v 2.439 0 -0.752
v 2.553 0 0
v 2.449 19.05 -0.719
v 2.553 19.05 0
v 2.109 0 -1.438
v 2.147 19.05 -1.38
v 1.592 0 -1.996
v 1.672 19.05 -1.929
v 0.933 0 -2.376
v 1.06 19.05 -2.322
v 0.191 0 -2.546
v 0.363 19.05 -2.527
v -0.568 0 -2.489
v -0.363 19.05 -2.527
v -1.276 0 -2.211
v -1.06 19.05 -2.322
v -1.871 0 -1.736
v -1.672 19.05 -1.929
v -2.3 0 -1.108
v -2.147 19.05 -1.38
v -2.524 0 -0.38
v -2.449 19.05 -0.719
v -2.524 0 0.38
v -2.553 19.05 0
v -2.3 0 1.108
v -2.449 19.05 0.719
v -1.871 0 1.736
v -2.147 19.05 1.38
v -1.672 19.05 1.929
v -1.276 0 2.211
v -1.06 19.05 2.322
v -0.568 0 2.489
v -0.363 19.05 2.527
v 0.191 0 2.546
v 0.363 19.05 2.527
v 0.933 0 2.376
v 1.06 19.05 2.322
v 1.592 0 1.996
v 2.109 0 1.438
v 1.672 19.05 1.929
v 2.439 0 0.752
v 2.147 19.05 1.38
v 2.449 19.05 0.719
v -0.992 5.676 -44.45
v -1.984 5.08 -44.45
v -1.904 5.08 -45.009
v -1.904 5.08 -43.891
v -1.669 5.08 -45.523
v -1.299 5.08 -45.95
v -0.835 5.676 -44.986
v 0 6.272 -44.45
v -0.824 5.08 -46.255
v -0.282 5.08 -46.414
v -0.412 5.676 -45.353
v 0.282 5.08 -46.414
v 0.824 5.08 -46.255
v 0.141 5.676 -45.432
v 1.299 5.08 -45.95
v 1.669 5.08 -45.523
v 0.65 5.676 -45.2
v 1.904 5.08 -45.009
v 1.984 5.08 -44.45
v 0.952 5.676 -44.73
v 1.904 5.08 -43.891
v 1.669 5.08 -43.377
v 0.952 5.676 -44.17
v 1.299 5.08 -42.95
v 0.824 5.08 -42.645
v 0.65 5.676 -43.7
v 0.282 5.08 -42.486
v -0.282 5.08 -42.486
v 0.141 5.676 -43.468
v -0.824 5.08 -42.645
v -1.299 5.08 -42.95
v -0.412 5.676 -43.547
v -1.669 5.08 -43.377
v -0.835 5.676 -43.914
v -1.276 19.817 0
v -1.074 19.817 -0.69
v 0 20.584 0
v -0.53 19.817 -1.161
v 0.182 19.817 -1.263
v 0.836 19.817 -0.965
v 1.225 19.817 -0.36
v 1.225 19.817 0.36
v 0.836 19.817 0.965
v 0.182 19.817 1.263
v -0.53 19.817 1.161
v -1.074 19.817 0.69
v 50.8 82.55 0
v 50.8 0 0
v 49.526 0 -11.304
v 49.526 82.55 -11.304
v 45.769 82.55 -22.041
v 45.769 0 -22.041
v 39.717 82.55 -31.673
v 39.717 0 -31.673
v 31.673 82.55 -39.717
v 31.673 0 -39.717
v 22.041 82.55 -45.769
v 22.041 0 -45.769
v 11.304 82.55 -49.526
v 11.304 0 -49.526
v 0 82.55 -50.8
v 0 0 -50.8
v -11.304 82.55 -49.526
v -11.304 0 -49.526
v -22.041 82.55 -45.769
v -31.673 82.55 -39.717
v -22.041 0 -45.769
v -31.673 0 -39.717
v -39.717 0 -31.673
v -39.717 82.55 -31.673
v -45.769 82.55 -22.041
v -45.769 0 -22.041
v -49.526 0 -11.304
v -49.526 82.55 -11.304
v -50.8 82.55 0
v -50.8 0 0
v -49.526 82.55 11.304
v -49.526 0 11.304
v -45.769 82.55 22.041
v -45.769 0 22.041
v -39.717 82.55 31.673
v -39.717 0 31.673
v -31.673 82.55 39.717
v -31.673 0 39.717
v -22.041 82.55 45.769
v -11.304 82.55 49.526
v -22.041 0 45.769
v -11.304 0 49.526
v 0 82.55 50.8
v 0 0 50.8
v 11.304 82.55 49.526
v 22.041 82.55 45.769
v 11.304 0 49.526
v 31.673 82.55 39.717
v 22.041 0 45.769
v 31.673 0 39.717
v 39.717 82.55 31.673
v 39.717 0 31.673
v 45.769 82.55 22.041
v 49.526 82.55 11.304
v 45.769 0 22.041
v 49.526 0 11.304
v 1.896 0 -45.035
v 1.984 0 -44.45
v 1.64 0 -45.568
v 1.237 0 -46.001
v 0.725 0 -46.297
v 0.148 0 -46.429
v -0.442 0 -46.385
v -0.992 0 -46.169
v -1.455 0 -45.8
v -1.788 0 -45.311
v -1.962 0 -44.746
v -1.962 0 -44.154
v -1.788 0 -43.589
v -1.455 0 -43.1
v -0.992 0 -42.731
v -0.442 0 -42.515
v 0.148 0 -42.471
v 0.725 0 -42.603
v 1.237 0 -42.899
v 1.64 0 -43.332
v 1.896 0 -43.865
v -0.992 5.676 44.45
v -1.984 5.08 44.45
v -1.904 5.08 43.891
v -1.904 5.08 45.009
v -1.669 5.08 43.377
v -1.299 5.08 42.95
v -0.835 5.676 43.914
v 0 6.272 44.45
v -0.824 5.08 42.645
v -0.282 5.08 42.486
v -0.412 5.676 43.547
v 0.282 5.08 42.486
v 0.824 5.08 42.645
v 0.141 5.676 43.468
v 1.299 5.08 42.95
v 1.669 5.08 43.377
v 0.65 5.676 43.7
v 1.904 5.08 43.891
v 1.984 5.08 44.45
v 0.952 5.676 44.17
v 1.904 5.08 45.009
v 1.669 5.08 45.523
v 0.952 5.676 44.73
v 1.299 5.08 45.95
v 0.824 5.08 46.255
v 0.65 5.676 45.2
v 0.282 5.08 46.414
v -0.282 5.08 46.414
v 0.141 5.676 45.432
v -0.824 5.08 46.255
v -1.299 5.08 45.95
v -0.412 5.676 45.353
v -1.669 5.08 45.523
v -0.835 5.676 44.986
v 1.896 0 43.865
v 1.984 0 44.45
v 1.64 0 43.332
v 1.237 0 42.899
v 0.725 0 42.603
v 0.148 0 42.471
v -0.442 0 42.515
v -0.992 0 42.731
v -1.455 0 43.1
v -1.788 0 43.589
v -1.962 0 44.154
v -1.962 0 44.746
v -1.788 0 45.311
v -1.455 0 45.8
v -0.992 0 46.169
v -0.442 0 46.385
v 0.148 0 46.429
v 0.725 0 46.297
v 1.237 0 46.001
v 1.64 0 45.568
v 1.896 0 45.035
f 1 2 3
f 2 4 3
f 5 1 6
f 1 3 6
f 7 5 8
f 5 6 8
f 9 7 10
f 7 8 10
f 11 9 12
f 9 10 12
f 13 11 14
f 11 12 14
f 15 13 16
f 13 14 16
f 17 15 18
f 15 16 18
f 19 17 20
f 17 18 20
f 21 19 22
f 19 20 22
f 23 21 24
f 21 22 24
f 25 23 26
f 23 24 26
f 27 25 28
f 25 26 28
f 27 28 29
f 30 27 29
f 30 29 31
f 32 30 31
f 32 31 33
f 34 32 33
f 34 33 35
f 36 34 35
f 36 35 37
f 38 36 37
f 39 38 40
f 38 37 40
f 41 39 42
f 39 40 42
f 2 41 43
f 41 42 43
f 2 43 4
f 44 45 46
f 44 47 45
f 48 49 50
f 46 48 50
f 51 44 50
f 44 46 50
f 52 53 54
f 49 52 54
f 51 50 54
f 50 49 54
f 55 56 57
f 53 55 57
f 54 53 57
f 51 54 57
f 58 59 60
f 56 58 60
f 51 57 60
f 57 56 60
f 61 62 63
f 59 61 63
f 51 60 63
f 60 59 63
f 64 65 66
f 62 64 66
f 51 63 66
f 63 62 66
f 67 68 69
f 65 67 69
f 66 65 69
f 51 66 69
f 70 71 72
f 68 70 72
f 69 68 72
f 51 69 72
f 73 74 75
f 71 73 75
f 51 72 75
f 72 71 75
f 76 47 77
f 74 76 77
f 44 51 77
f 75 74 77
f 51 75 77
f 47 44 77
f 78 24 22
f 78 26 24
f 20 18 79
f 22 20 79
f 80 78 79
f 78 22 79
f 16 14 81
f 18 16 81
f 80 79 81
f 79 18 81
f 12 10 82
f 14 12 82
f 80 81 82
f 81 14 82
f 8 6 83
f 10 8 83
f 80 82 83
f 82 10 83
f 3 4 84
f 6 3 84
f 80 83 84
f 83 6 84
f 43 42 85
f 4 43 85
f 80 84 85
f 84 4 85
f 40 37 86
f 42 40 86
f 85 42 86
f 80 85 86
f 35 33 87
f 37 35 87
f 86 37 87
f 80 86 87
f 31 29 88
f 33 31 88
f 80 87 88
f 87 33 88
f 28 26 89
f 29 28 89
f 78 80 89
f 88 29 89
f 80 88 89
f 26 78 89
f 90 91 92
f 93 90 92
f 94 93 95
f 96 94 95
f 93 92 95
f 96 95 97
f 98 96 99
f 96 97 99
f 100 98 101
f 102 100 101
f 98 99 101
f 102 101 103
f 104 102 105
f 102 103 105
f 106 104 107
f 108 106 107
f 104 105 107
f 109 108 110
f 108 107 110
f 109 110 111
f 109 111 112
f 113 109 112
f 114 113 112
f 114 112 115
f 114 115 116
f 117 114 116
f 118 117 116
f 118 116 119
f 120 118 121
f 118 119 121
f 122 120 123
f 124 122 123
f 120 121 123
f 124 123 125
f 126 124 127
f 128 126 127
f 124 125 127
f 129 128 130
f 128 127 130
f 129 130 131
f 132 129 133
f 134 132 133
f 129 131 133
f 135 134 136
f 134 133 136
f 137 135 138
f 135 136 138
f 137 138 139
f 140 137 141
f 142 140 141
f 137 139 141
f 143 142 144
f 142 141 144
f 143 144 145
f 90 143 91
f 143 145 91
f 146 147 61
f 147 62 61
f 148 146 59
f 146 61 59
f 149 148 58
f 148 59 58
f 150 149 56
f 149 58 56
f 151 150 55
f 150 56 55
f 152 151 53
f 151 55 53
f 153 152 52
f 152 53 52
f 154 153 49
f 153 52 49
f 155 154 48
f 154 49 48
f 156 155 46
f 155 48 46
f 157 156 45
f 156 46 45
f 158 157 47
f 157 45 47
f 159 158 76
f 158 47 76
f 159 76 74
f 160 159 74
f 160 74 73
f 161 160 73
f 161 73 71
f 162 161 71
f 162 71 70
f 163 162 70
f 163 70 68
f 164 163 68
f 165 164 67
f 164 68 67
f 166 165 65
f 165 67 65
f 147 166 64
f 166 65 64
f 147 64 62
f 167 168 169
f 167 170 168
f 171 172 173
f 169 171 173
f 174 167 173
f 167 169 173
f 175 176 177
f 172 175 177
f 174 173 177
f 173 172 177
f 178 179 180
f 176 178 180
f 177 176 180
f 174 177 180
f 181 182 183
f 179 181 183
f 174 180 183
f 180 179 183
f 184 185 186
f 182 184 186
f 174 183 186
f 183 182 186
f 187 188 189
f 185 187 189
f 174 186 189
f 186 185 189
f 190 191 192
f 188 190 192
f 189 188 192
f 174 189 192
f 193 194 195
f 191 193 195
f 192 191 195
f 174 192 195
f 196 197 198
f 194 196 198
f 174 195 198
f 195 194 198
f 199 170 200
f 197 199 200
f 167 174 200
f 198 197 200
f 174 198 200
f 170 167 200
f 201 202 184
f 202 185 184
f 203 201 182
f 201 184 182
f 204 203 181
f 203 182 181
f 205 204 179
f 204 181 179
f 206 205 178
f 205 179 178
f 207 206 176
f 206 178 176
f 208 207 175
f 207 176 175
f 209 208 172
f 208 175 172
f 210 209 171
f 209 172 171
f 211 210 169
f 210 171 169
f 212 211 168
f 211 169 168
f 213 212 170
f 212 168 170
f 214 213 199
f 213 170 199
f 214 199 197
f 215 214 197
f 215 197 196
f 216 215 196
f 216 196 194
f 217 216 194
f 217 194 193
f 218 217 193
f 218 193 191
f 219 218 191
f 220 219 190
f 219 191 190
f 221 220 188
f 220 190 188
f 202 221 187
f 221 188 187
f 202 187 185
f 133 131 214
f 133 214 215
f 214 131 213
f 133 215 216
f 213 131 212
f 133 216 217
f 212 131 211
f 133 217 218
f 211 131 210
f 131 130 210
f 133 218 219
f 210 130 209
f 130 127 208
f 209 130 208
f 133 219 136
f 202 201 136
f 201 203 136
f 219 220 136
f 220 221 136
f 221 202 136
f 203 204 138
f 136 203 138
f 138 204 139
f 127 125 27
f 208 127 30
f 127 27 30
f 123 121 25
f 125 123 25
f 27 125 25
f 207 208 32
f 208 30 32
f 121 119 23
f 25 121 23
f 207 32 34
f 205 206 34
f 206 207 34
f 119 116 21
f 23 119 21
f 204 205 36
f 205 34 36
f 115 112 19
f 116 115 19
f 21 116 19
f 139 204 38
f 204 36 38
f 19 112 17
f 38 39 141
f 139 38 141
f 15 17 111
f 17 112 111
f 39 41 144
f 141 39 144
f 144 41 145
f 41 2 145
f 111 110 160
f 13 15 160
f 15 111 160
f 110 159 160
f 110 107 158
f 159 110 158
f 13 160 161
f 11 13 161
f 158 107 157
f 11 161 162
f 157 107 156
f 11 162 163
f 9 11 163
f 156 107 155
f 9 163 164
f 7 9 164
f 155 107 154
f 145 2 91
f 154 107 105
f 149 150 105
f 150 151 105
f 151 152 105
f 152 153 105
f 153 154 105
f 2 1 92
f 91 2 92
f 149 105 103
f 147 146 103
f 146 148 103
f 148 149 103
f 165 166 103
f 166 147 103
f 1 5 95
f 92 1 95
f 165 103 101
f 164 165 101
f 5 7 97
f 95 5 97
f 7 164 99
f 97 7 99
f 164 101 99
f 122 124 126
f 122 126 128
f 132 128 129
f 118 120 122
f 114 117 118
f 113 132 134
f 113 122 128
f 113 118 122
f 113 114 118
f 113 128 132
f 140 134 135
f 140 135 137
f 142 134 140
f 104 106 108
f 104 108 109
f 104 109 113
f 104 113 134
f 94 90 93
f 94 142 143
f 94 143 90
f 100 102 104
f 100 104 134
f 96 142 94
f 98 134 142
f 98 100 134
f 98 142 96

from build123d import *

# Parameters (mm, degrees)
SKETCH1_R                           = 50.8
BOSS_EXTRUDE1_DEPTH                 = 82.55
F_1_4_20_TAPPED_HOLE1_D             = 5.1054
F_1_4_20_TAPPED_HOLE1_DEPTH         = 19.05
F_1_4_20_TAPPED_HOLE1_TIP           = 1.533816902
F_5_32_0_15625_DIAMETER_HOLE1_D     = 3.96875
F_5_32_0_15625_DIAMETER_HOLE1_DEPTH = 5.08
F_5_32_0_15625_DIAMETER_HOLE1_TIP   = 1.192332791


with BuildPart() as part:
    # Sketch1 → Boss-Extrude1 (new body)
    with BuildSketch(Plane(origin=(0, 0, 0), x_dir=(1, 0, 0), z_dir=(0, 1, 0))):
        Circle(SKETCH1_R)
    extrude(amount=BOSS_EXTRUDE1_DEPTH)

    # 1/4-20 Tapped Hole1
    with Locations(Plane(origin=(0, 0, 0), x_dir=(-1, 0, 0), z_dir=(0, -1, 0))):
        with Locations((0, 0)):
            Hole(F_1_4_20_TAPPED_HOLE1_D / 2, depth=F_1_4_20_TAPPED_HOLE1_DEPTH)
            with Locations((0, 0, -(F_1_4_20_TAPPED_HOLE1_DEPTH + F_1_4_20_TAPPED_HOLE1_TIP / 2))):  # 118° drill point
                Cone(0, F_1_4_20_TAPPED_HOLE1_D / 2, F_1_4_20_TAPPED_HOLE1_TIP, mode=Mode.SUBTRACT)

    # 5/32 (0.15625) Diameter Hole1
    with Locations(Plane(origin=(0, 0, 0), x_dir=(-1, 0, 0), z_dir=(0, -1, 0))):
        with Locations((0, 44.45), (0, -44.45)):
            Hole(F_5_32_0_15625_DIAMETER_HOLE1_D / 2, depth=F_5_32_0_15625_DIAMETER_HOLE1_DEPTH)
            with Locations((0, 0, -(F_5_32_0_15625_DIAMETER_HOLE1_DEPTH + F_5_32_0_15625_DIAMETER_HOLE1_TIP / 2))):  # 118° drill point
                Cone(0, F_5_32_0_15625_DIAMETER_HOLE1_D / 2, F_5_32_0_15625_DIAMETER_HOLE1_TIP, mode=Mode.SUBTRACT)


solid = part.part
